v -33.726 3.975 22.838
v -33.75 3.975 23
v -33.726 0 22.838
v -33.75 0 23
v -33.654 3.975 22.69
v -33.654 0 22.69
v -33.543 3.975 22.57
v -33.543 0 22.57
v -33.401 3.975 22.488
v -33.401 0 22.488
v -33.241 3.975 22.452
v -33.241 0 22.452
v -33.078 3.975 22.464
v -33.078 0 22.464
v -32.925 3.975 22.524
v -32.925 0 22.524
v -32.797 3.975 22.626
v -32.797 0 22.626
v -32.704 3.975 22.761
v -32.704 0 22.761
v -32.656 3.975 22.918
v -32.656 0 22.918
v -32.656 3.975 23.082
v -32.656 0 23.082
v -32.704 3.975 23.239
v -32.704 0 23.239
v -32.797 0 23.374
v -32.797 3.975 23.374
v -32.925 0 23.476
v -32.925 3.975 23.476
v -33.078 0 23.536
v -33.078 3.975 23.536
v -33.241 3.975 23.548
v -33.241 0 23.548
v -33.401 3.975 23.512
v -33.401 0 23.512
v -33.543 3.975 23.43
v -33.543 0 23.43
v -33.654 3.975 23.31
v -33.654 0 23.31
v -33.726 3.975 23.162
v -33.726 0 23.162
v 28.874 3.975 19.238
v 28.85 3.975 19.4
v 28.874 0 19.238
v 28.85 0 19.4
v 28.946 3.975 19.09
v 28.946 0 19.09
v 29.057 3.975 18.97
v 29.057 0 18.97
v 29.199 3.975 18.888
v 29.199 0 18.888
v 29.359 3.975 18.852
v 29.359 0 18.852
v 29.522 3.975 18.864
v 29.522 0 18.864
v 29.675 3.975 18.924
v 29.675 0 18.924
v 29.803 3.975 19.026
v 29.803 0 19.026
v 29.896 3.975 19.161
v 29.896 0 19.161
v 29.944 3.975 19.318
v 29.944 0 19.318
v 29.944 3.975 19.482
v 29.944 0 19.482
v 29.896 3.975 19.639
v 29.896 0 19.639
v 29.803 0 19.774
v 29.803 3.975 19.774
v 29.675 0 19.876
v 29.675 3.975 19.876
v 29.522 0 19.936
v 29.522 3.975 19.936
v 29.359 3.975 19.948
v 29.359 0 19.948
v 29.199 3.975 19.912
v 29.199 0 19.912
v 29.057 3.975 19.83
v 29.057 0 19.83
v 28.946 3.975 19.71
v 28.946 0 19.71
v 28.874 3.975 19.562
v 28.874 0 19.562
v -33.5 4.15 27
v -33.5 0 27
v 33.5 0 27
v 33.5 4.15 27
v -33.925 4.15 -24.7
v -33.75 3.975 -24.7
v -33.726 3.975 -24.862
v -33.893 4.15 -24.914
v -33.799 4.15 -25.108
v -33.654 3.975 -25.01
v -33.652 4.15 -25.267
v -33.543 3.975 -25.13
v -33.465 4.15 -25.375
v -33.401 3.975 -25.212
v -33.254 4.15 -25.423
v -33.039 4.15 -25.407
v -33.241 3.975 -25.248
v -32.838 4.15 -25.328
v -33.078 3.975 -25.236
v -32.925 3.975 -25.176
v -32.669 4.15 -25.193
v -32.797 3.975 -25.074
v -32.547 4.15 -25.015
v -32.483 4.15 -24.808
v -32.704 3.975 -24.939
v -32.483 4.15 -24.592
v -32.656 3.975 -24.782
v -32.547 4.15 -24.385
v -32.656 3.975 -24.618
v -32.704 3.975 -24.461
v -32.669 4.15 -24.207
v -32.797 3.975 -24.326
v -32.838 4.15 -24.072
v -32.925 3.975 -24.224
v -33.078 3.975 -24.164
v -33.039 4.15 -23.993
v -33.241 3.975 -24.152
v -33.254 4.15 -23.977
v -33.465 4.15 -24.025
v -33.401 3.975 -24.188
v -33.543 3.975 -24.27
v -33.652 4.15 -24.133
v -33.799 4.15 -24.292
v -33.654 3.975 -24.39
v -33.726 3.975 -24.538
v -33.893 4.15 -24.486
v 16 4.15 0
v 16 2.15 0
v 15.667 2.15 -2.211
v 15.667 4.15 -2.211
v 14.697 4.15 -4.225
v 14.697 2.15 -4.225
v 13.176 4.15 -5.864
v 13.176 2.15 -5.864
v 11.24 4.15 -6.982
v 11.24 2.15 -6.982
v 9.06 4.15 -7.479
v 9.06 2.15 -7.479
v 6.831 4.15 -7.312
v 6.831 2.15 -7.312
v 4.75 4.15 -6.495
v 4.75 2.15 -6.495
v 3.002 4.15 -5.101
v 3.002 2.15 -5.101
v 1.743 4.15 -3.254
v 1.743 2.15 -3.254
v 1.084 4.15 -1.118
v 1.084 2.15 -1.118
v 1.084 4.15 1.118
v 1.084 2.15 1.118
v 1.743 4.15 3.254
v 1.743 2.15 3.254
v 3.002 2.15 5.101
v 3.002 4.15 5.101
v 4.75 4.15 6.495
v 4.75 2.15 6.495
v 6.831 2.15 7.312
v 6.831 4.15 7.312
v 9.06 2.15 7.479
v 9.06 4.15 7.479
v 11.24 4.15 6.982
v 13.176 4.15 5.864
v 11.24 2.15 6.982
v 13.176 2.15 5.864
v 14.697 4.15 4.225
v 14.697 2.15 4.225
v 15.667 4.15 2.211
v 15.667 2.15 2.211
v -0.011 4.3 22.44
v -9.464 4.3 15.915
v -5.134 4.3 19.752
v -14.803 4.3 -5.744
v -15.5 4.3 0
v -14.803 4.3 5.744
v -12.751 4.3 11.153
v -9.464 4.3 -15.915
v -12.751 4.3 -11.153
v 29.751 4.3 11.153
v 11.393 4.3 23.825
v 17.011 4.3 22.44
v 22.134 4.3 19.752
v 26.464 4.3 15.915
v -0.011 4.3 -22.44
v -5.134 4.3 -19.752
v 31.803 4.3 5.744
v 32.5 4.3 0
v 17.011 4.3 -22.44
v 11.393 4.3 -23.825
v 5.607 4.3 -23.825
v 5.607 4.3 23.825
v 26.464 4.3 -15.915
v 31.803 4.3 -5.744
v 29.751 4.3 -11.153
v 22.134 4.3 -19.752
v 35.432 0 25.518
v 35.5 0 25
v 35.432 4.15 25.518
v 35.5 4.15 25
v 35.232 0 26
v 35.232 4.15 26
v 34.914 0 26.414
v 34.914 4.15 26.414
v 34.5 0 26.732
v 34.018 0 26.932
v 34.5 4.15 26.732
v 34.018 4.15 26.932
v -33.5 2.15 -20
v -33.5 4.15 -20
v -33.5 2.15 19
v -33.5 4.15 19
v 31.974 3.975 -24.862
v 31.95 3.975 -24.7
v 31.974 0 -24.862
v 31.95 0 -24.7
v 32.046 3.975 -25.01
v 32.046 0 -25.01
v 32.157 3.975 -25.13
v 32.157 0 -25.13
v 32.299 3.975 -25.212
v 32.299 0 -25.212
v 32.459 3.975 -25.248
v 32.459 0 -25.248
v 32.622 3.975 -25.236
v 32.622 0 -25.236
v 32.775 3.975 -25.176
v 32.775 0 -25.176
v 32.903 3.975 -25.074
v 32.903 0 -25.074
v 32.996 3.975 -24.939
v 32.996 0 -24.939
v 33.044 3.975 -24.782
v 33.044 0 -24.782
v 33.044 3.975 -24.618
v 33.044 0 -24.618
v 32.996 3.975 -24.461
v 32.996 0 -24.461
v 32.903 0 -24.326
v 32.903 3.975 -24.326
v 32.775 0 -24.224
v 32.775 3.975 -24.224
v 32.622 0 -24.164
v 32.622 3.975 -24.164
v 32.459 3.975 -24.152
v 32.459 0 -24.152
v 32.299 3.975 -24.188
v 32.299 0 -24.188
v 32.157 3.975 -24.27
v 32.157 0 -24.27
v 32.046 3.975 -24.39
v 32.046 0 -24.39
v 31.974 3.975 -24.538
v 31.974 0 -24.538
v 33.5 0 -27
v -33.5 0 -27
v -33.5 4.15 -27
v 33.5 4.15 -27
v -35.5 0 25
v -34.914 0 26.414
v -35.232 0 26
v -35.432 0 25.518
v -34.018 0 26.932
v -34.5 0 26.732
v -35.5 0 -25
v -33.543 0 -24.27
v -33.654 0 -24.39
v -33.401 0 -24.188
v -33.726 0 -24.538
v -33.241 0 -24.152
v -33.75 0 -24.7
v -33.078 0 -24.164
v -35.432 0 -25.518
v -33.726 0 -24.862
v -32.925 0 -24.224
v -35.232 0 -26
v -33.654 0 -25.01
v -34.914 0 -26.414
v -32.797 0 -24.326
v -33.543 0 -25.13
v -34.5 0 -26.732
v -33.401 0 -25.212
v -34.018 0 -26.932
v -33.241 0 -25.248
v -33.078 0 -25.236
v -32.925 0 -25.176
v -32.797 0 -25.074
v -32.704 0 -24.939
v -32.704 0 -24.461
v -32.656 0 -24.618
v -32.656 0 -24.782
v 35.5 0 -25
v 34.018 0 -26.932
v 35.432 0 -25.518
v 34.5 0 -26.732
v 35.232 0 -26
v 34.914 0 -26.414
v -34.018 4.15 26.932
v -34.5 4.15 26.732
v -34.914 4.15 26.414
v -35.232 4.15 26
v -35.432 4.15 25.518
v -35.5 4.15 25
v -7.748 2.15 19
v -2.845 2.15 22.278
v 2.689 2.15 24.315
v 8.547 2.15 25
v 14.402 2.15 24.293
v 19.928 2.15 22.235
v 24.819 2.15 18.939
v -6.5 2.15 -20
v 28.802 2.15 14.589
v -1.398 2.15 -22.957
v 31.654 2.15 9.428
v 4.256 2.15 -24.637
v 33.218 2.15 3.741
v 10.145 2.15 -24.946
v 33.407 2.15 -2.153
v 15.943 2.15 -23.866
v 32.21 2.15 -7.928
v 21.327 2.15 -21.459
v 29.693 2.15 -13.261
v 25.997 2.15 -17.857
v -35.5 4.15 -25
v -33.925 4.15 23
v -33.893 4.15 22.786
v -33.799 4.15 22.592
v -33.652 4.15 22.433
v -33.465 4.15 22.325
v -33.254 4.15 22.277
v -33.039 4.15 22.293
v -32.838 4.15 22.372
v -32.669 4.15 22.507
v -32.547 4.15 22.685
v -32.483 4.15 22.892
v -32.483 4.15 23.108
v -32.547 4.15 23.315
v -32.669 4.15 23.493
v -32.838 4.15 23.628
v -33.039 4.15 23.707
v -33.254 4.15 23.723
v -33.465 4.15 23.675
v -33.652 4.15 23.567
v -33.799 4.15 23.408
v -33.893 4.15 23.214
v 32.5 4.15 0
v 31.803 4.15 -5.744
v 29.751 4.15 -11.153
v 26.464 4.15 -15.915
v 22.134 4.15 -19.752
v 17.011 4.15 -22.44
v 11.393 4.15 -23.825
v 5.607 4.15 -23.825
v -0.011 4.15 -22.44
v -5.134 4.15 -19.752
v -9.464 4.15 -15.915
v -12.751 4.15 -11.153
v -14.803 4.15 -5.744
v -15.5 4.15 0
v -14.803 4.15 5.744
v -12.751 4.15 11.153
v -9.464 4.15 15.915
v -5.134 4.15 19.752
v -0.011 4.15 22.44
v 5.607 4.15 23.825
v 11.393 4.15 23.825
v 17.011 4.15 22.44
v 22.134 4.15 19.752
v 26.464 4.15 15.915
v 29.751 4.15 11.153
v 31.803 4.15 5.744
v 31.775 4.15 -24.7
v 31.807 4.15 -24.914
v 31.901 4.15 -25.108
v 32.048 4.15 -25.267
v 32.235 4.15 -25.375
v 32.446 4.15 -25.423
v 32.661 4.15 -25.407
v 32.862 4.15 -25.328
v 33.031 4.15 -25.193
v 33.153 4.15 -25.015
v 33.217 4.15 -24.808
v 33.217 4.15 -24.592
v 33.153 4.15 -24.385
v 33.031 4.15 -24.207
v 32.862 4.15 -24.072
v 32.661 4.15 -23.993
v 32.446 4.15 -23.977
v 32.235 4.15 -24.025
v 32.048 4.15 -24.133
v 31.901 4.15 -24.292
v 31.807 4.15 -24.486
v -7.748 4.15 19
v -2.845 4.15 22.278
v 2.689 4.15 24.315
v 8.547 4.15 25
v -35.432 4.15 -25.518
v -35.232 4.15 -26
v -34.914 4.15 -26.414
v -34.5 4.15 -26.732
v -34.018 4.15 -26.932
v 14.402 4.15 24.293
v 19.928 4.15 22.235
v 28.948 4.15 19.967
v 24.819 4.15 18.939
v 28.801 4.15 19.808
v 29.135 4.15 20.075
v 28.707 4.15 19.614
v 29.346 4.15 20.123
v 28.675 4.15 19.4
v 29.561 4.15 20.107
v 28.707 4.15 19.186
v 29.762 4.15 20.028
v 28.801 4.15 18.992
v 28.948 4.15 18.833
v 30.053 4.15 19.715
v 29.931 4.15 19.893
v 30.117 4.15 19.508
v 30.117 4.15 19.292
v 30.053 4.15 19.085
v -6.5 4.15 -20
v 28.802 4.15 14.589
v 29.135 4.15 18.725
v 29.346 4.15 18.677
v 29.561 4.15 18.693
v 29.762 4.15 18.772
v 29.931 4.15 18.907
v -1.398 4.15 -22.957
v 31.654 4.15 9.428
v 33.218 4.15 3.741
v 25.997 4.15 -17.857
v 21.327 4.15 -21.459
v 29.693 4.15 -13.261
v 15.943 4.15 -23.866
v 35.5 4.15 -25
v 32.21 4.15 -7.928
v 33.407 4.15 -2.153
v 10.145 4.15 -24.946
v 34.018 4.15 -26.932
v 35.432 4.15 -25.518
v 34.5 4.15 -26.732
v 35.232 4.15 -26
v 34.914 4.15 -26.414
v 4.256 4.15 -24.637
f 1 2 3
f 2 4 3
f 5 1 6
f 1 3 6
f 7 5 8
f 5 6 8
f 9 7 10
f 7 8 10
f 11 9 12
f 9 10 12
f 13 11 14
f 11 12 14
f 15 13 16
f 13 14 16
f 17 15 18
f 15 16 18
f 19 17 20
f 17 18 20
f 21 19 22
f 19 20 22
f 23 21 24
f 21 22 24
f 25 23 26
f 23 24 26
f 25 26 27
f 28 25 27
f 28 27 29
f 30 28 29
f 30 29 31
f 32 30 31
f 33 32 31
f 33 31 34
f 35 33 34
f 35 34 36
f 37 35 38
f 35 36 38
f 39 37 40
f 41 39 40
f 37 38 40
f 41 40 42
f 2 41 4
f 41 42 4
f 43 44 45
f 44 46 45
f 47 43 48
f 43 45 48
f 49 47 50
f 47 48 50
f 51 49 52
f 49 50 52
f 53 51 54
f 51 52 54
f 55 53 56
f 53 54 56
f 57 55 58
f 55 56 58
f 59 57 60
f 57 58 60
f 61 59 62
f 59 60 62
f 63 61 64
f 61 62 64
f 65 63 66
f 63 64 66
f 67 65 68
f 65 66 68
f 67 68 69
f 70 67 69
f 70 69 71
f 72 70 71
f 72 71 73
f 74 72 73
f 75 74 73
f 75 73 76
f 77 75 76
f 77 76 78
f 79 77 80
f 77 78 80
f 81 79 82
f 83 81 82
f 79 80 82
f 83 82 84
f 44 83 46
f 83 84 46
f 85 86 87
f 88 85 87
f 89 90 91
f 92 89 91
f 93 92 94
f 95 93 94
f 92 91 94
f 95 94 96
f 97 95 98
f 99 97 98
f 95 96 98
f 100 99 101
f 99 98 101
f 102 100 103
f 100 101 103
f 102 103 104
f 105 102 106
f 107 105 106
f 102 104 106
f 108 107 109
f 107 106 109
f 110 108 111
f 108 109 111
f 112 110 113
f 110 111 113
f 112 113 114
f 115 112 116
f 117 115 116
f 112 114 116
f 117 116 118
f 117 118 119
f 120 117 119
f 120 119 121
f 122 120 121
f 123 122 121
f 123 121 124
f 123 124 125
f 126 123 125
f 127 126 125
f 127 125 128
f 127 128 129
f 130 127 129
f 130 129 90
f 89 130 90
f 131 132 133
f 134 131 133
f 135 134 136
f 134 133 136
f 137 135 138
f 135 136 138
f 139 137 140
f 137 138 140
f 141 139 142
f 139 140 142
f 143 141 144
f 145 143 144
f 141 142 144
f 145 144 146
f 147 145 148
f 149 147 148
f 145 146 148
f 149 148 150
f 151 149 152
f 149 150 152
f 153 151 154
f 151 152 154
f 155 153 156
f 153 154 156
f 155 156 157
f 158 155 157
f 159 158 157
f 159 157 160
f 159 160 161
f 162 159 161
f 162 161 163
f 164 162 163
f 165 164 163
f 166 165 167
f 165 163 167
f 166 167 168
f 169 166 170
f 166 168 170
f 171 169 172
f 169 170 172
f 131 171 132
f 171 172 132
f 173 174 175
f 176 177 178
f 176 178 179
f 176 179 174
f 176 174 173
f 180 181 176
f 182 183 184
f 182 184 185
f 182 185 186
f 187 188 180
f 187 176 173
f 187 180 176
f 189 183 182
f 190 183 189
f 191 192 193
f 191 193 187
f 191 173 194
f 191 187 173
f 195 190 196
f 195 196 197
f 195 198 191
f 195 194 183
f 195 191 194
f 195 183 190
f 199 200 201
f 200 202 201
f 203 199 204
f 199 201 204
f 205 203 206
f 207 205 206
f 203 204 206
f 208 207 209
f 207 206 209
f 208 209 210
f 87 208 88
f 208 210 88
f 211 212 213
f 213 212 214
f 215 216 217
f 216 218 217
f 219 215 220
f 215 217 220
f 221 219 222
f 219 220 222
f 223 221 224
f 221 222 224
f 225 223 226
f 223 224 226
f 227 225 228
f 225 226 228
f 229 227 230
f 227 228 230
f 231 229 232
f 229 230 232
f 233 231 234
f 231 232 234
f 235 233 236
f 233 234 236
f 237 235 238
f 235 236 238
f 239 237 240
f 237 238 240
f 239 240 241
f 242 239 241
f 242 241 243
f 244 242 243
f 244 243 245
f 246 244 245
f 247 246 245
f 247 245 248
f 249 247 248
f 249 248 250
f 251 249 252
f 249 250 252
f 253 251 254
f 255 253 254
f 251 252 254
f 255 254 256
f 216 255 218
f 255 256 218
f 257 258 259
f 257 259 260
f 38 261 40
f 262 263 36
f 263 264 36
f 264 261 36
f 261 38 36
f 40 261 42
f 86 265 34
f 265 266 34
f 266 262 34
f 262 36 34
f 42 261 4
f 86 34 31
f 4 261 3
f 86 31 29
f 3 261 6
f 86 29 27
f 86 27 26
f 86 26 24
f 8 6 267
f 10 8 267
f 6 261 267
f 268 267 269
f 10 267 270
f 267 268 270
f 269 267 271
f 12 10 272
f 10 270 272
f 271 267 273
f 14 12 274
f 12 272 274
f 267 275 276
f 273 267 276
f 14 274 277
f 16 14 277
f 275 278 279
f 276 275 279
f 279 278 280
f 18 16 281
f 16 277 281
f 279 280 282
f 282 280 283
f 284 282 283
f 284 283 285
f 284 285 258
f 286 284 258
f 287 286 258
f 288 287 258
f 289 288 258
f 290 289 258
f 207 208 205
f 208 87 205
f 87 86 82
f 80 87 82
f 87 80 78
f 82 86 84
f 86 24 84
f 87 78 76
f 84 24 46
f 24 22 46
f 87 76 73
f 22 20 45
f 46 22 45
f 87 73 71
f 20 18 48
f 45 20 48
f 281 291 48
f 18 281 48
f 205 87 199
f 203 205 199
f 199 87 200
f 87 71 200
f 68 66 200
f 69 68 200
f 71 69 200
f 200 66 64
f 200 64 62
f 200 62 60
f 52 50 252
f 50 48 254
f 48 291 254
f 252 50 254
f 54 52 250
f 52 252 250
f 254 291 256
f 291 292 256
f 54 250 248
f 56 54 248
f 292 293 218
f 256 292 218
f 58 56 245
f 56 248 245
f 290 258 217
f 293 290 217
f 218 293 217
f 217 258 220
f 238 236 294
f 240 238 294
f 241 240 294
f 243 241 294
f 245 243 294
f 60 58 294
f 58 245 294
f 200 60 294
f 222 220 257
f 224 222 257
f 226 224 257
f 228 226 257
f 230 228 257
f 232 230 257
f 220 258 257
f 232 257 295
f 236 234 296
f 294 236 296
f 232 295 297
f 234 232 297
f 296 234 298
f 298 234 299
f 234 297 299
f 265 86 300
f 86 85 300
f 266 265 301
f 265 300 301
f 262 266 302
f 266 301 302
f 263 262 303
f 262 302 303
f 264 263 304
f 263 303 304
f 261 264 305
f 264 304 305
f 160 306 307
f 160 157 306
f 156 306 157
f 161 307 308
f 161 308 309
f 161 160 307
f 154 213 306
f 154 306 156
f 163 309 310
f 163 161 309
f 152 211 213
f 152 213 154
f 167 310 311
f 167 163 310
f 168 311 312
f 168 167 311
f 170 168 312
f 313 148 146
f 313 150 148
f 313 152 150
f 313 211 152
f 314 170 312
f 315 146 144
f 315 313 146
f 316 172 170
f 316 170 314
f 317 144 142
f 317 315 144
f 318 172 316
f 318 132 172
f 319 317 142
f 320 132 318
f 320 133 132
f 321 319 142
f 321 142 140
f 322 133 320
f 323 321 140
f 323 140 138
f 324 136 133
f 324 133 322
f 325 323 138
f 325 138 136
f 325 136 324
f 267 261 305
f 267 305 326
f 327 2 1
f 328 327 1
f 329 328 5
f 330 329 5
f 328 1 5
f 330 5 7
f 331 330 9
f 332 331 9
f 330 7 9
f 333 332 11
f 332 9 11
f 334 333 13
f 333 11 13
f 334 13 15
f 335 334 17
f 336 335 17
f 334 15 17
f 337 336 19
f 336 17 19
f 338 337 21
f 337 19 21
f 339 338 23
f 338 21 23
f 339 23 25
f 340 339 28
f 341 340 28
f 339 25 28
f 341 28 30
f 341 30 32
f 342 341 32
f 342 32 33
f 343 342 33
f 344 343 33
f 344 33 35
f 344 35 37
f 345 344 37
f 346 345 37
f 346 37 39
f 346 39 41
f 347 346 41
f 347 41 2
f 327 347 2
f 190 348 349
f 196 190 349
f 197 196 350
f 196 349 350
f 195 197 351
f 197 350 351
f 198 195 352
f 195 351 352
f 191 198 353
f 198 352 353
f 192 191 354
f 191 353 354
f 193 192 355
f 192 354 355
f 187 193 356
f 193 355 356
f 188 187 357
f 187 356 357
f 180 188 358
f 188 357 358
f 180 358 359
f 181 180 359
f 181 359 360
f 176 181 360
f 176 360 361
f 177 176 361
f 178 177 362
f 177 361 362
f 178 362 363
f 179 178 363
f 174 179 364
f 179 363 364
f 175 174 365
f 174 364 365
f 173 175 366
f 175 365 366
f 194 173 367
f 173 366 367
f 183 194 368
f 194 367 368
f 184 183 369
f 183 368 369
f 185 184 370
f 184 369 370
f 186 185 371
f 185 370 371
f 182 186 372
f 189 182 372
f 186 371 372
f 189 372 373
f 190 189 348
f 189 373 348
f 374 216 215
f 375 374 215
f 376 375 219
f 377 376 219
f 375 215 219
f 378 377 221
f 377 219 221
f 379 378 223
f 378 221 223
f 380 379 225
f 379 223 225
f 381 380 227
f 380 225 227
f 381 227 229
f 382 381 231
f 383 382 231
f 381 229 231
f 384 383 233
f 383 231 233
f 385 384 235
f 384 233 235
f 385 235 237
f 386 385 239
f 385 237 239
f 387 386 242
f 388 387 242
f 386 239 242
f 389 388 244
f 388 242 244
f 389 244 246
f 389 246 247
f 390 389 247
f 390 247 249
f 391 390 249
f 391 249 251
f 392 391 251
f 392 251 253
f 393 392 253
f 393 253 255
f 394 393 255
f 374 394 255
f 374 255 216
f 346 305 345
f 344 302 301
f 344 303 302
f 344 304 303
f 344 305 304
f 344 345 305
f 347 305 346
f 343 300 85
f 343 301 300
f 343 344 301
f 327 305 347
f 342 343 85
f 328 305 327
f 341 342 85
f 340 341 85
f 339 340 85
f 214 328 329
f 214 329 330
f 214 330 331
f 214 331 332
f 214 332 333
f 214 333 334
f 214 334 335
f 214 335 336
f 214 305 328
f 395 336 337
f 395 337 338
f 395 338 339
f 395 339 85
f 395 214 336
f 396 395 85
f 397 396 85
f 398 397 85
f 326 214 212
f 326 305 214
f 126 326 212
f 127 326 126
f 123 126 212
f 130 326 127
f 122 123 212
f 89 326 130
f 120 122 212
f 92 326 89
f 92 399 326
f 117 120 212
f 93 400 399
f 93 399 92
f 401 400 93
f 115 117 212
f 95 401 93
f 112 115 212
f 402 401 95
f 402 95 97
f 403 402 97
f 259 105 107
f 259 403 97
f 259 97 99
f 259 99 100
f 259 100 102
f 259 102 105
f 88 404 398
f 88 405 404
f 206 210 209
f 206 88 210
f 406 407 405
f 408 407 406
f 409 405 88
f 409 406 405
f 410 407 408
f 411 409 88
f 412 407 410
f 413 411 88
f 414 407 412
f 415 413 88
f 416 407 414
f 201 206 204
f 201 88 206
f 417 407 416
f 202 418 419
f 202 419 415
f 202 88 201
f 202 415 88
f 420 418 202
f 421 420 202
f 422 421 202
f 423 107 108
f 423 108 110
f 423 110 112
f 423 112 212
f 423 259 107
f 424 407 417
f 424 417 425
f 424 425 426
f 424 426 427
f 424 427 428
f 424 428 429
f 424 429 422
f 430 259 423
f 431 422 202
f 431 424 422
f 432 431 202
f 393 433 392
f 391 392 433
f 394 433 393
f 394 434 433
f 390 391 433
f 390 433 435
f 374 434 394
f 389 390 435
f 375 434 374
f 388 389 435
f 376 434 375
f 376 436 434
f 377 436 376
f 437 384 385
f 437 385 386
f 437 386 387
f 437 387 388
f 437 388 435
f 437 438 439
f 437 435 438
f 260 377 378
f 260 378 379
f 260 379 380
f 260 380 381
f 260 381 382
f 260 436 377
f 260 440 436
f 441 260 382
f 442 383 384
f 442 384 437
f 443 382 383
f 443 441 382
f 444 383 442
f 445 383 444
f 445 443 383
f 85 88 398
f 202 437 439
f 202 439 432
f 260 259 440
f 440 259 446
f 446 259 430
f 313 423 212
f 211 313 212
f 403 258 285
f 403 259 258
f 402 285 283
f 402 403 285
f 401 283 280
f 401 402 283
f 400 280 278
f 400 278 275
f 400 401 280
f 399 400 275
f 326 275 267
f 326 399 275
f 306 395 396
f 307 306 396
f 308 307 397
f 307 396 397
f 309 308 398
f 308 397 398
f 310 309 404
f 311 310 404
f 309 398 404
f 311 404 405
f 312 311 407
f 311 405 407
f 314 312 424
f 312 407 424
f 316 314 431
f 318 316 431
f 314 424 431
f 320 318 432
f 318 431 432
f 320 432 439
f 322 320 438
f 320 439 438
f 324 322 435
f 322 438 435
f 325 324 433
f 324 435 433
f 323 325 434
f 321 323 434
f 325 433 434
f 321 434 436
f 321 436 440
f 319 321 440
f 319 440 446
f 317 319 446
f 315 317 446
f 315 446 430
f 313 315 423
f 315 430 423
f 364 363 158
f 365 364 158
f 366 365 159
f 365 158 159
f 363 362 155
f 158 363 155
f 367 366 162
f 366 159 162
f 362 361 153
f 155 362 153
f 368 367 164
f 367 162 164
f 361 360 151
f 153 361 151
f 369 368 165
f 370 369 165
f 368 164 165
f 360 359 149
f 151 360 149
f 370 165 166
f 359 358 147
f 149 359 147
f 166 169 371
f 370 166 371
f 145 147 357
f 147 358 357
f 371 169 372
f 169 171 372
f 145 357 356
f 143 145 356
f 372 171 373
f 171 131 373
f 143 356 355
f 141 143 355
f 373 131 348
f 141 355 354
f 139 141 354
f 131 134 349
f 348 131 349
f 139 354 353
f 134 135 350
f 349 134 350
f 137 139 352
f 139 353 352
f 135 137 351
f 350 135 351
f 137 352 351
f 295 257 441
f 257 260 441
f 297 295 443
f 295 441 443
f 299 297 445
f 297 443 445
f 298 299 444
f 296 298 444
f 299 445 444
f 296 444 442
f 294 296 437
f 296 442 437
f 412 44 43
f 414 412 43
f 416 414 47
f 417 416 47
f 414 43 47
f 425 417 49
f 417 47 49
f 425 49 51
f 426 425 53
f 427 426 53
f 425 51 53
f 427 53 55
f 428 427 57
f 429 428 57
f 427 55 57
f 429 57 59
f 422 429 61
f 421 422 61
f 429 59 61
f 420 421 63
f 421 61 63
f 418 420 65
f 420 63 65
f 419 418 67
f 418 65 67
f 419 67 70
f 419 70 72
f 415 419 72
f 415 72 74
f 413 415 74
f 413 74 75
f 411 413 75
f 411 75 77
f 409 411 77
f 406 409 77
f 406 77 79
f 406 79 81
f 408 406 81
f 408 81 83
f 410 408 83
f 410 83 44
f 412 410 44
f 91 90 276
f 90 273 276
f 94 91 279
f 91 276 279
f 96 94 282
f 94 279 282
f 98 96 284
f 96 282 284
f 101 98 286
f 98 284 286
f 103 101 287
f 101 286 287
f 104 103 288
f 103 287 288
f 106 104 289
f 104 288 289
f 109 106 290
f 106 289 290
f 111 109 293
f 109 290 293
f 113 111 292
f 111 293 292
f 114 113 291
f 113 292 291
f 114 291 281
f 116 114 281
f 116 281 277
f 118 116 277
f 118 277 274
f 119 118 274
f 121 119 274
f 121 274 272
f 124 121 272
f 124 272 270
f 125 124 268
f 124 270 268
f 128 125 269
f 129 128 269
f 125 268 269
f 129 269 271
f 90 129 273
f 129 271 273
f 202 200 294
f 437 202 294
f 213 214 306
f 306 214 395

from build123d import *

# Parameters (mm, degrees)
SKETCH1_W                         = 71
SKETCH1_H                         = 54
BOSS_EXTRUDE1_DEPTH               = 4.15
CUT_EXTRUDE1_DEPTH                = 2
SKETCH4_R                         = 7.5
BOSS_EXTRUDE3_DEPTH               = 2
SKETCH5_R                         = 24
BOSS_EXTRUDE4_DEPTH               = 0.15
M1_4X0_3_TAPPED_HOLE1_D           = 1.1
M1_4X0_3_TAPPED_HOLE1_CSINK_D     = 1.45
M1_4X0_3_TAPPED_HOLE1_CSINK_ANGLE = 90
FILLET1_R                         = 2


with BuildPart() as part:
    # Sketch1 → Boss-Extrude1 (new body)
    with BuildSketch(Plane(origin=(0, 0, 0), x_dir=(1, 0, 0), z_dir=(0, 1, 0))):
        Rectangle(SKETCH1_W, SKETCH1_H)
    extrude(amount=BOSS_EXTRUDE1_DEPTH)

    # Sketch3 → Cut-Extrude1 (cut)
    with BuildSketch(Plane(origin=(0, 4.15, 0), x_dir=(1, 0, 0), z_dir=(0, 1, 0))):
        with BuildLine():
            Line((-6.5, 20), (-33.5, 20))
            Line((-33.5, 20), (-33.5, -19))
            Line((-33.5, -19), (-7.748076809, -19))
            ThreePointArc((-7.748076809, -19), (33.487208249, -0.799639875), (-6.5, 20))
        make_face()
    extrude(amount=-CUT_EXTRUDE1_DEPTH, mode=Mode.SUBTRACT)

    # Sketch4 → Boss-Extrude3 (add)
    with BuildSketch(Plane(origin=(0, 2.15, 0), x_dir=(1, 0, 0), z_dir=(0, 1, 0))):
        with Locations((8.5, 0)):
            Circle(SKETCH4_R)
    extrude(amount=BOSS_EXTRUDE3_DEPTH)

    # Sketch5 → Boss-Extrude4 (add)
    with BuildSketch(Plane(origin=(0, 4.15, 0), x_dir=(1, 0, 0), z_dir=(0, 1, 0))):
        with Locations((8.5, 0)):
            Circle(SKETCH5_R)
    extrude(amount=BOSS_EXTRUDE4_DEPTH)

    # M1.4x0.3 Tapped Hole1 (through all)
    with Locations(Plane(origin=(0, 4.15, 0), x_dir=(1, 0, 0), z_dir=(0, 1, 0))):
        with Locations((-33.2, 24.7), (-33.2, -23), (29.4, -19.4), (32.5, 24.7)):
            CounterSinkHole(M1_4X0_3_TAPPED_HOLE1_D / 2, M1_4X0_3_TAPPED_HOLE1_CSINK_D / 2, counter_sink_angle=M1_4X0_3_TAPPED_HOLE1_CSINK_ANGLE)

    # Fillet1
    fillet1_edges = [part.edges().sort_by_distance(p)[0] for p in [
        (35.5, 2.075, 27),
        (-35.5, 2.075, 27),
        (-35.5, 2.075, -27),
        (35.5, 2.075, -27),
    ]]
    fillet(fillet1_edges, radius=FILLET1_R)


solid = part.part
